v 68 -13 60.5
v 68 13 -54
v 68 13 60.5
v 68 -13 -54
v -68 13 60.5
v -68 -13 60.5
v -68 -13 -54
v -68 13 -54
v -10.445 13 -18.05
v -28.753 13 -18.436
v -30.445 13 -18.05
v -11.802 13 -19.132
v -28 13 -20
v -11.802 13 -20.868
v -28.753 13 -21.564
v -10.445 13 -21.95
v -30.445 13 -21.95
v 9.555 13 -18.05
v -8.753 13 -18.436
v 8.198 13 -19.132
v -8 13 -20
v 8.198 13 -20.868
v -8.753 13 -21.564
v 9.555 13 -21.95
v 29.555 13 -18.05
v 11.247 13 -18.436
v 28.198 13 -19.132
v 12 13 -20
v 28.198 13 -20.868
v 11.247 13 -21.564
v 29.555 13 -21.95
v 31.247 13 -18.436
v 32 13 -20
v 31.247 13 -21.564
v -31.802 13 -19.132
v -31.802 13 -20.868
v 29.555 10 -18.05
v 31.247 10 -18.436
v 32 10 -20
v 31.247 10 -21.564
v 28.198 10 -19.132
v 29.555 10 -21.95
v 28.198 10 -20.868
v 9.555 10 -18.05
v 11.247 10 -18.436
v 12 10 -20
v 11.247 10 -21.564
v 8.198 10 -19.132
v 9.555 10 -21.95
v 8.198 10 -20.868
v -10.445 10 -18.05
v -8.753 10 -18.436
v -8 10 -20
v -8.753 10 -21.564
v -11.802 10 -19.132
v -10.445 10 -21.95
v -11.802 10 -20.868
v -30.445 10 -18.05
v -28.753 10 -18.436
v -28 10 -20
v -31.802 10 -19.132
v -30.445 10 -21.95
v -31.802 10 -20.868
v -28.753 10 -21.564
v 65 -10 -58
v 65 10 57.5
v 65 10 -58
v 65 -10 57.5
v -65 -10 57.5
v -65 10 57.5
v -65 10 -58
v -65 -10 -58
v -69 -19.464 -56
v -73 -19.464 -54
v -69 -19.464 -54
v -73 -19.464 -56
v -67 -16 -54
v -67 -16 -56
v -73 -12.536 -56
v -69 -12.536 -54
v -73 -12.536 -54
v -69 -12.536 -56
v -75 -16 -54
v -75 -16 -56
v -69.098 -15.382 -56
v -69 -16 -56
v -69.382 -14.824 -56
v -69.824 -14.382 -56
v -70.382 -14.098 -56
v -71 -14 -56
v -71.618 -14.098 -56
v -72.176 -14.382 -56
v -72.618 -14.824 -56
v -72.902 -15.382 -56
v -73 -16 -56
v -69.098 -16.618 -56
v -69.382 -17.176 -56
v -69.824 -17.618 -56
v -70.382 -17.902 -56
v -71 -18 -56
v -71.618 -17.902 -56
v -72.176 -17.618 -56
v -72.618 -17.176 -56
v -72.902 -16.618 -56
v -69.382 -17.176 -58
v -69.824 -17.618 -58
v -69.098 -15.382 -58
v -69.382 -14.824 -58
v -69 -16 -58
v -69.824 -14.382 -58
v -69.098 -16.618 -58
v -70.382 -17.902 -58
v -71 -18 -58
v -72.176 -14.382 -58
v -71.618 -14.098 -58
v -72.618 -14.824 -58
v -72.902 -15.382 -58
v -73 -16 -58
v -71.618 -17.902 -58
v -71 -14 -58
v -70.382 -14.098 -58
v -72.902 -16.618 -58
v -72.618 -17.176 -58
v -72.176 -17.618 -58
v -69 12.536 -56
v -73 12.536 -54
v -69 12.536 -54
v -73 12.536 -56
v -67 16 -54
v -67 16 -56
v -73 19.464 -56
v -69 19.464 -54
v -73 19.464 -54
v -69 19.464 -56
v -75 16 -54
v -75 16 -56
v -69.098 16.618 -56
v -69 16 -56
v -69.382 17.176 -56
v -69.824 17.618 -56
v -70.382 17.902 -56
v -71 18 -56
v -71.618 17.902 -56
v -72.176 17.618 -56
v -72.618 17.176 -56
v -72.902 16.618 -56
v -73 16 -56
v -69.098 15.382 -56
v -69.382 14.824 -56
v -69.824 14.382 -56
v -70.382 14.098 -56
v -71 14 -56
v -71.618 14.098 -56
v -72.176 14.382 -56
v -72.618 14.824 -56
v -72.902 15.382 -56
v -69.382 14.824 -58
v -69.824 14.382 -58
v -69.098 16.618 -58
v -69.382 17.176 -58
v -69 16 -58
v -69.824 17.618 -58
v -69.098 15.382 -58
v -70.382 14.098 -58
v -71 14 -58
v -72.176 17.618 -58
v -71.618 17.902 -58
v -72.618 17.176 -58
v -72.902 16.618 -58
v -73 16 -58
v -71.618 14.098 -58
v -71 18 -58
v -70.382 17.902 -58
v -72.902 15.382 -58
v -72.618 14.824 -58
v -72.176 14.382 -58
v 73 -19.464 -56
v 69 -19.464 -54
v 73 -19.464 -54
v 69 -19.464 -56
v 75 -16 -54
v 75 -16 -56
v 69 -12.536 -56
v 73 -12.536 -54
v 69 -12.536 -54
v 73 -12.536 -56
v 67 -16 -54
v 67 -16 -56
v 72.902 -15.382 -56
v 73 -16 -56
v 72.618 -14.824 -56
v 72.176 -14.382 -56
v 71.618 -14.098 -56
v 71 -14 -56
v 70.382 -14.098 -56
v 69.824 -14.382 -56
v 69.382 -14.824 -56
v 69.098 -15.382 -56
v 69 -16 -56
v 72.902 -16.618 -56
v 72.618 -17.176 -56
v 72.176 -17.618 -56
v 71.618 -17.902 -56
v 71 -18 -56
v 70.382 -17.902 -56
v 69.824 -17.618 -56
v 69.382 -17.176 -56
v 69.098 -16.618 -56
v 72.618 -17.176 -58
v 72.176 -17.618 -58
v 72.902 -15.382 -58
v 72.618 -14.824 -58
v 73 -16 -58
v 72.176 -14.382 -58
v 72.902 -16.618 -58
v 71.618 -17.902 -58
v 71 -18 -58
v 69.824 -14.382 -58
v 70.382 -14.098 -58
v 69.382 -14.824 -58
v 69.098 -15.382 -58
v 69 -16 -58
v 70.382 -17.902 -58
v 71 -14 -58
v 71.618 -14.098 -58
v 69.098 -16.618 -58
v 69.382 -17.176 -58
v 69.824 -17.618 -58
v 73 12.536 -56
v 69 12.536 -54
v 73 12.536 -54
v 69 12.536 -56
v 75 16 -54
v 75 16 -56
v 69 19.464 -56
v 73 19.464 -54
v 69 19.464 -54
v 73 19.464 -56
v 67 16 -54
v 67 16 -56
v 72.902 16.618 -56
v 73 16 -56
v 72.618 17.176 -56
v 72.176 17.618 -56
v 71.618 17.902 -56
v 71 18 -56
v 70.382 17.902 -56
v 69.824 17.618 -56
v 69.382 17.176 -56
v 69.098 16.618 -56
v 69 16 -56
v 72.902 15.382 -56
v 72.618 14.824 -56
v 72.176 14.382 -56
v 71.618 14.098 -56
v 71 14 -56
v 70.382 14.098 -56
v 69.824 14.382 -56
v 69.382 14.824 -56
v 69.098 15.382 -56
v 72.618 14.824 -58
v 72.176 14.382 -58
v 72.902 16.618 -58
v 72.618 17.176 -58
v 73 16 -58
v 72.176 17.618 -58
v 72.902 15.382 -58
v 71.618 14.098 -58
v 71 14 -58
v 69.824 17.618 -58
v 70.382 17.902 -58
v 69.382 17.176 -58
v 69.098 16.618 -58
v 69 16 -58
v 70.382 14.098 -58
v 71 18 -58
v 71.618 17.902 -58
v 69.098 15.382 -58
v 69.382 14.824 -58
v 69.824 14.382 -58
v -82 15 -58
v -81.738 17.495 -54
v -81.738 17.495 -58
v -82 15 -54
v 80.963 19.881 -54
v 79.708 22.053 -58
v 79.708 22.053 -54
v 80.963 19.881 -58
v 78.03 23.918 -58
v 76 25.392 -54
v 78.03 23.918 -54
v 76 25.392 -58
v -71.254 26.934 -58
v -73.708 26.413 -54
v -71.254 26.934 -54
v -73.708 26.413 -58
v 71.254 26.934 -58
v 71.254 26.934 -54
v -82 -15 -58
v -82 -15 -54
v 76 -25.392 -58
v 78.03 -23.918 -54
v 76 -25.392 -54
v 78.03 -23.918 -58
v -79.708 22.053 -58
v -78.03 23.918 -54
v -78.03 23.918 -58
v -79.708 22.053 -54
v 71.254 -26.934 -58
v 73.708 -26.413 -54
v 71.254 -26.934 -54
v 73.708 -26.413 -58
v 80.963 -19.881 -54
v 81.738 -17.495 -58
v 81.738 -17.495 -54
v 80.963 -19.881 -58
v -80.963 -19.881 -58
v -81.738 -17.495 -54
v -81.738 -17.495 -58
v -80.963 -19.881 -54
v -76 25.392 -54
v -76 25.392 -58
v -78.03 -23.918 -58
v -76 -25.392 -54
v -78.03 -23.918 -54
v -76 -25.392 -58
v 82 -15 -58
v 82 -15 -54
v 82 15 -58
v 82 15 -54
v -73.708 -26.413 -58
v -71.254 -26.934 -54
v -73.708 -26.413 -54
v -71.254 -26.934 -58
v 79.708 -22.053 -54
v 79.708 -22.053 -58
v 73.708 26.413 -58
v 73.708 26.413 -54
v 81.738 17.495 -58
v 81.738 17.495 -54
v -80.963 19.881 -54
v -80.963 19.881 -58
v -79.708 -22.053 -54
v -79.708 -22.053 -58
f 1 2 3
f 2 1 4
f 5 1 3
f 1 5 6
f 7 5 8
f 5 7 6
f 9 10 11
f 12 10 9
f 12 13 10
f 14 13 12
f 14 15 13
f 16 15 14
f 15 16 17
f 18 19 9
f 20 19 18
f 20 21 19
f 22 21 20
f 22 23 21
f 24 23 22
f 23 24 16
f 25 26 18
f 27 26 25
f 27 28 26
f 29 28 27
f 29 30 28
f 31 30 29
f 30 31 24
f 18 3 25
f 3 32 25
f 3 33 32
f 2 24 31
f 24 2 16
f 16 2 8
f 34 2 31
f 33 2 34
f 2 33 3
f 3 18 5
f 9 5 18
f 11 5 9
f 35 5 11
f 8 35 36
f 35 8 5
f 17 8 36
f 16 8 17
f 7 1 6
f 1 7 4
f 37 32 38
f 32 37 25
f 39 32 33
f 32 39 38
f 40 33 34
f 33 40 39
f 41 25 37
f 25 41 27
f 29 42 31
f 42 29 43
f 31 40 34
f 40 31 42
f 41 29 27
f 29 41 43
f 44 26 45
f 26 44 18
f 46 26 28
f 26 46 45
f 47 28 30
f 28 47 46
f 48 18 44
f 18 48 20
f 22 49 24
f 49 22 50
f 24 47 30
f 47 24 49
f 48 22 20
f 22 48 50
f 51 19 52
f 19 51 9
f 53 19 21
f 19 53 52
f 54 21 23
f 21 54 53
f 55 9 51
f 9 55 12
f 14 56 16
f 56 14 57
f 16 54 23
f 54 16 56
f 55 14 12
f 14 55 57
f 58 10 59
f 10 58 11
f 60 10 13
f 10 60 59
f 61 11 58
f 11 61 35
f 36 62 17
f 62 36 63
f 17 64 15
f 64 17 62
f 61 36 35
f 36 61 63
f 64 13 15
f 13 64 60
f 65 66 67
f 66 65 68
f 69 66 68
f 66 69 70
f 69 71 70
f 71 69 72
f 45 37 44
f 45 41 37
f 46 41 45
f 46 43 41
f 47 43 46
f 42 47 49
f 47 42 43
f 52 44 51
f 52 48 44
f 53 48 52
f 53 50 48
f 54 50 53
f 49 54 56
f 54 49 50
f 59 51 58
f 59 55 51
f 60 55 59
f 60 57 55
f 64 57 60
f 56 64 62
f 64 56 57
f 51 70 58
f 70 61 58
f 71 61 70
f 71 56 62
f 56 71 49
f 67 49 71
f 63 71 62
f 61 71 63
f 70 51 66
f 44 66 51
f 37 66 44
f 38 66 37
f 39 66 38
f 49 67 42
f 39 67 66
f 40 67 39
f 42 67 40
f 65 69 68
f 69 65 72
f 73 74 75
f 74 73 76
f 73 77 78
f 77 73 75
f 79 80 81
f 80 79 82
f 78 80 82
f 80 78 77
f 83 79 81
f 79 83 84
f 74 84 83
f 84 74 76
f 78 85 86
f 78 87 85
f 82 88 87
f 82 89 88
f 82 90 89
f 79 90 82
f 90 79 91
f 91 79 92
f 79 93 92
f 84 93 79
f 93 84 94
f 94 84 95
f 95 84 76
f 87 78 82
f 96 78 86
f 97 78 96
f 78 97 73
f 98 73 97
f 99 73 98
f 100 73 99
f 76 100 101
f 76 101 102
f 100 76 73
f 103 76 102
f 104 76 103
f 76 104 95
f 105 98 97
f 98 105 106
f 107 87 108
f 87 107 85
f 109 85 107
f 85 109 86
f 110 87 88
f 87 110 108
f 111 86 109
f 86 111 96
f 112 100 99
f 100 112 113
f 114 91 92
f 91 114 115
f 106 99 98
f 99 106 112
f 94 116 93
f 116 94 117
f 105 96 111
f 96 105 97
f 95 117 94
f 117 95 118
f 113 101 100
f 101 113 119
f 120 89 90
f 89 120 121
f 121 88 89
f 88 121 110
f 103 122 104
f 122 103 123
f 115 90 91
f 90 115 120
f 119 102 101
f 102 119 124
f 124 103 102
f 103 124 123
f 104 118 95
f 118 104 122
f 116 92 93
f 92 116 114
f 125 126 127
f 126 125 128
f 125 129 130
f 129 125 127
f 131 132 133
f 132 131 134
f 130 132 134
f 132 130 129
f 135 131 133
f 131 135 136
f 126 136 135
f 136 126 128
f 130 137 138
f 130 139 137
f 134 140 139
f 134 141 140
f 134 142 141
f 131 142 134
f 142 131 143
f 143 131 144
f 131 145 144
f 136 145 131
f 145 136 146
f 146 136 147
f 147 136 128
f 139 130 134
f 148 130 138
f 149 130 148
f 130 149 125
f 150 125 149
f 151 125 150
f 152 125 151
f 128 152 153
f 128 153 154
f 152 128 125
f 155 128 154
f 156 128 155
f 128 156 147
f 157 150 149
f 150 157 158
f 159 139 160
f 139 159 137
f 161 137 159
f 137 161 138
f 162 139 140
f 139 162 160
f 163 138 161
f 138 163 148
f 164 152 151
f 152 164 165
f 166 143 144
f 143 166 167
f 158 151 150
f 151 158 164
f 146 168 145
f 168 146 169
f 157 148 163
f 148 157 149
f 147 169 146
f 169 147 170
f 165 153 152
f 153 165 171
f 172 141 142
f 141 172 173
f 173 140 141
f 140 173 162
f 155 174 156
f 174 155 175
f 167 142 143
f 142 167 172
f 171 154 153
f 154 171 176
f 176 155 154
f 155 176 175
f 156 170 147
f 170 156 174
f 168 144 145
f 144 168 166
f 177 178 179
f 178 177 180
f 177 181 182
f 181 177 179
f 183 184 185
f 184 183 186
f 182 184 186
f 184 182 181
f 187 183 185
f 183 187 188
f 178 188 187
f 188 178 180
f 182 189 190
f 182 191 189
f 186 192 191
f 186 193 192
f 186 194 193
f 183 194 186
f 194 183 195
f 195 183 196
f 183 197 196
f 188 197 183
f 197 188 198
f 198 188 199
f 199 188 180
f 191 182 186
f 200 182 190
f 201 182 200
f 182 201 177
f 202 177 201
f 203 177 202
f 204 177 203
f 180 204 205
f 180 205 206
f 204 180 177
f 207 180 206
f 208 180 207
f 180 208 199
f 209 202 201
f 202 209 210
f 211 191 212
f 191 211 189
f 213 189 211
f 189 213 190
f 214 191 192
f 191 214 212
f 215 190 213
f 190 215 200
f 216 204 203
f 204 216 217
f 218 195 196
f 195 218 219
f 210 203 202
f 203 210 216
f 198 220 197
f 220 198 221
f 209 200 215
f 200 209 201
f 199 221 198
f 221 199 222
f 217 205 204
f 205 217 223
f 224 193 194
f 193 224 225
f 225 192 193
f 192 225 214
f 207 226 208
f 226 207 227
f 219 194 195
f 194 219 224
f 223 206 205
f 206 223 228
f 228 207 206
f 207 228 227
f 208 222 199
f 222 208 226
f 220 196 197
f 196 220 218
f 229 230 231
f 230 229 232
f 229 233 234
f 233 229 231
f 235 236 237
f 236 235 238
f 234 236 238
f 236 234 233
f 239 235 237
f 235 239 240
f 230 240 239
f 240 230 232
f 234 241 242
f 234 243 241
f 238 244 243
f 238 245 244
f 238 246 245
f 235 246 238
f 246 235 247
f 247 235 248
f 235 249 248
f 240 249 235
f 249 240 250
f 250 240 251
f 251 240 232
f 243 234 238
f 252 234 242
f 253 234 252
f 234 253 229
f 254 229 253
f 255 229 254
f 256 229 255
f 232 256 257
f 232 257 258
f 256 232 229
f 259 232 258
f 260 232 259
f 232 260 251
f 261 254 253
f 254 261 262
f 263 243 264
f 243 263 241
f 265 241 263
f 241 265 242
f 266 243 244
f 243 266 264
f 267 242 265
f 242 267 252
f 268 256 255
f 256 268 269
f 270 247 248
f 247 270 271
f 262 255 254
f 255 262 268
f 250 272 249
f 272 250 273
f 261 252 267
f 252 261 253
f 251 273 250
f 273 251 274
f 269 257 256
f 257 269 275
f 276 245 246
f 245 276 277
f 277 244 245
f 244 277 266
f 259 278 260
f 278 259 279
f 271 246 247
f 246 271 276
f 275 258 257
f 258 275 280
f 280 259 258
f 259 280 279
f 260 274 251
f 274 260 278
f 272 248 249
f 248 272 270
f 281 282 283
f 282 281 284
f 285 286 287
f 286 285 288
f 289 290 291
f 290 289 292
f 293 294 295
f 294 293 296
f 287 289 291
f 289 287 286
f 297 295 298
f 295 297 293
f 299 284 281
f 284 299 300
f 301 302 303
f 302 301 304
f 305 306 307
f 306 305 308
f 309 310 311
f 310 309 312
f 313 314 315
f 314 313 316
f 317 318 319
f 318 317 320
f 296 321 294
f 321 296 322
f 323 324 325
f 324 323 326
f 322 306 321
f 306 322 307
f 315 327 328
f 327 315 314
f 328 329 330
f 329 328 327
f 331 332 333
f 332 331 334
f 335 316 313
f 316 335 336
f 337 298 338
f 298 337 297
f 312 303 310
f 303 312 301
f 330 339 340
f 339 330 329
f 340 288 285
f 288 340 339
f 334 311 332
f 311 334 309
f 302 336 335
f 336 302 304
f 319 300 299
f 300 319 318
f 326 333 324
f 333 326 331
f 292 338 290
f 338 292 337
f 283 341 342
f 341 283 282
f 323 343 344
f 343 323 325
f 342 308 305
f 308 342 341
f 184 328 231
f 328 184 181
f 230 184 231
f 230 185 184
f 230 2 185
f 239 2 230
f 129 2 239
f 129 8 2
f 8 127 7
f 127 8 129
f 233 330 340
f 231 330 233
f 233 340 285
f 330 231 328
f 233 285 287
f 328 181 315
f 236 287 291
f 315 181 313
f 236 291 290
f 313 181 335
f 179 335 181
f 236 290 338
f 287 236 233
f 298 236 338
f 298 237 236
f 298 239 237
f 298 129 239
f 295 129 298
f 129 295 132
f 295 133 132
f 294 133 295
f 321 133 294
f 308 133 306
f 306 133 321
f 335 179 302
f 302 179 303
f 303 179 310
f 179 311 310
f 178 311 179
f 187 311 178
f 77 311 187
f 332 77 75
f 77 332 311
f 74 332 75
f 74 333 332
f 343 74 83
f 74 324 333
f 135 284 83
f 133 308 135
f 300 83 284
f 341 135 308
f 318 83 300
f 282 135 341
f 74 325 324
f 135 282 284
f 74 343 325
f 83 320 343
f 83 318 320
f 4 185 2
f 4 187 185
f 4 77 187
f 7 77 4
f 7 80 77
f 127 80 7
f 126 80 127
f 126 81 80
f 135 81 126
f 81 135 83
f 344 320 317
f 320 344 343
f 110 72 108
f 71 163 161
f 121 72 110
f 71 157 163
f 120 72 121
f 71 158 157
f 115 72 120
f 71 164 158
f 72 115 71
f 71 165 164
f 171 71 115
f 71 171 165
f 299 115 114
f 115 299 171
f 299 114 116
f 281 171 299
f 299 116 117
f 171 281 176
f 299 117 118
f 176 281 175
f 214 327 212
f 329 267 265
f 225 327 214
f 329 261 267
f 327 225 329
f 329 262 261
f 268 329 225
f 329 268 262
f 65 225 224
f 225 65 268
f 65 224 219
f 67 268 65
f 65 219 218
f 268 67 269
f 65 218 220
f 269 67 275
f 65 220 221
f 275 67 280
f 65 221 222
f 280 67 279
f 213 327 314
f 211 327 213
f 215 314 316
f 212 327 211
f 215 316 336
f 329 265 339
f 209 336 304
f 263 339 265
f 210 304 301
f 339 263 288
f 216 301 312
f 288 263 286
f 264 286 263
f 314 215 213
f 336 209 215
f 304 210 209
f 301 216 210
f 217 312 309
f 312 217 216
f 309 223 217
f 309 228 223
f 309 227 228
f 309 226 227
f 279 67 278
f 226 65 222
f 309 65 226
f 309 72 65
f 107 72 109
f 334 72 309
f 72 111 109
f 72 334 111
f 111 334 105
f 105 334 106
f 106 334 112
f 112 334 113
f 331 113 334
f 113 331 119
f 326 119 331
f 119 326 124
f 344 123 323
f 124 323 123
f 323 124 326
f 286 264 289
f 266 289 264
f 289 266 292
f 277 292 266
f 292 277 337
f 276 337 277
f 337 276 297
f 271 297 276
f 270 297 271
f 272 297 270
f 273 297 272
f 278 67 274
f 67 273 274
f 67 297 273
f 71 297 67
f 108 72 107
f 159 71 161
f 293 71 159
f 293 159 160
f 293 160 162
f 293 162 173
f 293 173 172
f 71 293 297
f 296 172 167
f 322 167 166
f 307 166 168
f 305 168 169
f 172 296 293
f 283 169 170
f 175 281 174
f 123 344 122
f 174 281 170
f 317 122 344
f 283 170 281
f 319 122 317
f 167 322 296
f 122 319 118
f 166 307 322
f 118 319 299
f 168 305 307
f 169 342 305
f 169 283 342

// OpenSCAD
/*
 * Written by Dermot Tynan, Kalopa Research.
 * GPLv2.
 *
 * This is the definition for the five mast supports on the upper
 * leading-edge of the mast, A8 -> A12.
 *
 * All dimensions are in mm.
 */

module m4_nut_trap()
{
	union() {
		translate([0, 0, -2]) cylinder(r = 4, h = 8, $fn = 6, center = true);
		cylinder(r = 2, h = 20, center = true, $fn = 20);
	}
}

module board_housing()
{
	difference() {
		translate([0, 0, 3]) cube([136, 26, 115], center = true);
		translate([30, 13, -20]) rotate([90, 0, 0]) cylinder(r = 2, h = 10, center = true);
		translate([10, 13, -20]) rotate([90, 0, 0]) cylinder(r = 2, h = 10, center = true);
		translate([-10, 13, -20]) rotate([90, 0, 0]) cylinder(r = 2, h = 10, center = true);
		translate([-30, 13, -20]) rotate([90, 0, 0]) cylinder(r = 2, h = 10, center = true);
		cube([130, 20, 115], center = true);

	}
}

module deck_mounting()
{
	difference() {
		minkowski() {
			cube([140, 30, 2], center = true);
			cylinder(r = 12, h = 2, center = true);
		}
		translate([-71, -16, 6]) m4_nut_trap();
		translate([-71, 16, 6]) m4_nut_trap();
		translate([71, -16, 6]) m4_nut_trap();
		translate([71, 16, 6]) m4_nut_trap();
		cube([130, 20, 115], center = true);
	}
}

module mocon_box()
{
	difference() {
		union() {
			board_housing();
			translate([0, 0, -56]) deck_mounting();
		}
		cube([130, 20, 115], center = true);
	}
}

mocon_box();
